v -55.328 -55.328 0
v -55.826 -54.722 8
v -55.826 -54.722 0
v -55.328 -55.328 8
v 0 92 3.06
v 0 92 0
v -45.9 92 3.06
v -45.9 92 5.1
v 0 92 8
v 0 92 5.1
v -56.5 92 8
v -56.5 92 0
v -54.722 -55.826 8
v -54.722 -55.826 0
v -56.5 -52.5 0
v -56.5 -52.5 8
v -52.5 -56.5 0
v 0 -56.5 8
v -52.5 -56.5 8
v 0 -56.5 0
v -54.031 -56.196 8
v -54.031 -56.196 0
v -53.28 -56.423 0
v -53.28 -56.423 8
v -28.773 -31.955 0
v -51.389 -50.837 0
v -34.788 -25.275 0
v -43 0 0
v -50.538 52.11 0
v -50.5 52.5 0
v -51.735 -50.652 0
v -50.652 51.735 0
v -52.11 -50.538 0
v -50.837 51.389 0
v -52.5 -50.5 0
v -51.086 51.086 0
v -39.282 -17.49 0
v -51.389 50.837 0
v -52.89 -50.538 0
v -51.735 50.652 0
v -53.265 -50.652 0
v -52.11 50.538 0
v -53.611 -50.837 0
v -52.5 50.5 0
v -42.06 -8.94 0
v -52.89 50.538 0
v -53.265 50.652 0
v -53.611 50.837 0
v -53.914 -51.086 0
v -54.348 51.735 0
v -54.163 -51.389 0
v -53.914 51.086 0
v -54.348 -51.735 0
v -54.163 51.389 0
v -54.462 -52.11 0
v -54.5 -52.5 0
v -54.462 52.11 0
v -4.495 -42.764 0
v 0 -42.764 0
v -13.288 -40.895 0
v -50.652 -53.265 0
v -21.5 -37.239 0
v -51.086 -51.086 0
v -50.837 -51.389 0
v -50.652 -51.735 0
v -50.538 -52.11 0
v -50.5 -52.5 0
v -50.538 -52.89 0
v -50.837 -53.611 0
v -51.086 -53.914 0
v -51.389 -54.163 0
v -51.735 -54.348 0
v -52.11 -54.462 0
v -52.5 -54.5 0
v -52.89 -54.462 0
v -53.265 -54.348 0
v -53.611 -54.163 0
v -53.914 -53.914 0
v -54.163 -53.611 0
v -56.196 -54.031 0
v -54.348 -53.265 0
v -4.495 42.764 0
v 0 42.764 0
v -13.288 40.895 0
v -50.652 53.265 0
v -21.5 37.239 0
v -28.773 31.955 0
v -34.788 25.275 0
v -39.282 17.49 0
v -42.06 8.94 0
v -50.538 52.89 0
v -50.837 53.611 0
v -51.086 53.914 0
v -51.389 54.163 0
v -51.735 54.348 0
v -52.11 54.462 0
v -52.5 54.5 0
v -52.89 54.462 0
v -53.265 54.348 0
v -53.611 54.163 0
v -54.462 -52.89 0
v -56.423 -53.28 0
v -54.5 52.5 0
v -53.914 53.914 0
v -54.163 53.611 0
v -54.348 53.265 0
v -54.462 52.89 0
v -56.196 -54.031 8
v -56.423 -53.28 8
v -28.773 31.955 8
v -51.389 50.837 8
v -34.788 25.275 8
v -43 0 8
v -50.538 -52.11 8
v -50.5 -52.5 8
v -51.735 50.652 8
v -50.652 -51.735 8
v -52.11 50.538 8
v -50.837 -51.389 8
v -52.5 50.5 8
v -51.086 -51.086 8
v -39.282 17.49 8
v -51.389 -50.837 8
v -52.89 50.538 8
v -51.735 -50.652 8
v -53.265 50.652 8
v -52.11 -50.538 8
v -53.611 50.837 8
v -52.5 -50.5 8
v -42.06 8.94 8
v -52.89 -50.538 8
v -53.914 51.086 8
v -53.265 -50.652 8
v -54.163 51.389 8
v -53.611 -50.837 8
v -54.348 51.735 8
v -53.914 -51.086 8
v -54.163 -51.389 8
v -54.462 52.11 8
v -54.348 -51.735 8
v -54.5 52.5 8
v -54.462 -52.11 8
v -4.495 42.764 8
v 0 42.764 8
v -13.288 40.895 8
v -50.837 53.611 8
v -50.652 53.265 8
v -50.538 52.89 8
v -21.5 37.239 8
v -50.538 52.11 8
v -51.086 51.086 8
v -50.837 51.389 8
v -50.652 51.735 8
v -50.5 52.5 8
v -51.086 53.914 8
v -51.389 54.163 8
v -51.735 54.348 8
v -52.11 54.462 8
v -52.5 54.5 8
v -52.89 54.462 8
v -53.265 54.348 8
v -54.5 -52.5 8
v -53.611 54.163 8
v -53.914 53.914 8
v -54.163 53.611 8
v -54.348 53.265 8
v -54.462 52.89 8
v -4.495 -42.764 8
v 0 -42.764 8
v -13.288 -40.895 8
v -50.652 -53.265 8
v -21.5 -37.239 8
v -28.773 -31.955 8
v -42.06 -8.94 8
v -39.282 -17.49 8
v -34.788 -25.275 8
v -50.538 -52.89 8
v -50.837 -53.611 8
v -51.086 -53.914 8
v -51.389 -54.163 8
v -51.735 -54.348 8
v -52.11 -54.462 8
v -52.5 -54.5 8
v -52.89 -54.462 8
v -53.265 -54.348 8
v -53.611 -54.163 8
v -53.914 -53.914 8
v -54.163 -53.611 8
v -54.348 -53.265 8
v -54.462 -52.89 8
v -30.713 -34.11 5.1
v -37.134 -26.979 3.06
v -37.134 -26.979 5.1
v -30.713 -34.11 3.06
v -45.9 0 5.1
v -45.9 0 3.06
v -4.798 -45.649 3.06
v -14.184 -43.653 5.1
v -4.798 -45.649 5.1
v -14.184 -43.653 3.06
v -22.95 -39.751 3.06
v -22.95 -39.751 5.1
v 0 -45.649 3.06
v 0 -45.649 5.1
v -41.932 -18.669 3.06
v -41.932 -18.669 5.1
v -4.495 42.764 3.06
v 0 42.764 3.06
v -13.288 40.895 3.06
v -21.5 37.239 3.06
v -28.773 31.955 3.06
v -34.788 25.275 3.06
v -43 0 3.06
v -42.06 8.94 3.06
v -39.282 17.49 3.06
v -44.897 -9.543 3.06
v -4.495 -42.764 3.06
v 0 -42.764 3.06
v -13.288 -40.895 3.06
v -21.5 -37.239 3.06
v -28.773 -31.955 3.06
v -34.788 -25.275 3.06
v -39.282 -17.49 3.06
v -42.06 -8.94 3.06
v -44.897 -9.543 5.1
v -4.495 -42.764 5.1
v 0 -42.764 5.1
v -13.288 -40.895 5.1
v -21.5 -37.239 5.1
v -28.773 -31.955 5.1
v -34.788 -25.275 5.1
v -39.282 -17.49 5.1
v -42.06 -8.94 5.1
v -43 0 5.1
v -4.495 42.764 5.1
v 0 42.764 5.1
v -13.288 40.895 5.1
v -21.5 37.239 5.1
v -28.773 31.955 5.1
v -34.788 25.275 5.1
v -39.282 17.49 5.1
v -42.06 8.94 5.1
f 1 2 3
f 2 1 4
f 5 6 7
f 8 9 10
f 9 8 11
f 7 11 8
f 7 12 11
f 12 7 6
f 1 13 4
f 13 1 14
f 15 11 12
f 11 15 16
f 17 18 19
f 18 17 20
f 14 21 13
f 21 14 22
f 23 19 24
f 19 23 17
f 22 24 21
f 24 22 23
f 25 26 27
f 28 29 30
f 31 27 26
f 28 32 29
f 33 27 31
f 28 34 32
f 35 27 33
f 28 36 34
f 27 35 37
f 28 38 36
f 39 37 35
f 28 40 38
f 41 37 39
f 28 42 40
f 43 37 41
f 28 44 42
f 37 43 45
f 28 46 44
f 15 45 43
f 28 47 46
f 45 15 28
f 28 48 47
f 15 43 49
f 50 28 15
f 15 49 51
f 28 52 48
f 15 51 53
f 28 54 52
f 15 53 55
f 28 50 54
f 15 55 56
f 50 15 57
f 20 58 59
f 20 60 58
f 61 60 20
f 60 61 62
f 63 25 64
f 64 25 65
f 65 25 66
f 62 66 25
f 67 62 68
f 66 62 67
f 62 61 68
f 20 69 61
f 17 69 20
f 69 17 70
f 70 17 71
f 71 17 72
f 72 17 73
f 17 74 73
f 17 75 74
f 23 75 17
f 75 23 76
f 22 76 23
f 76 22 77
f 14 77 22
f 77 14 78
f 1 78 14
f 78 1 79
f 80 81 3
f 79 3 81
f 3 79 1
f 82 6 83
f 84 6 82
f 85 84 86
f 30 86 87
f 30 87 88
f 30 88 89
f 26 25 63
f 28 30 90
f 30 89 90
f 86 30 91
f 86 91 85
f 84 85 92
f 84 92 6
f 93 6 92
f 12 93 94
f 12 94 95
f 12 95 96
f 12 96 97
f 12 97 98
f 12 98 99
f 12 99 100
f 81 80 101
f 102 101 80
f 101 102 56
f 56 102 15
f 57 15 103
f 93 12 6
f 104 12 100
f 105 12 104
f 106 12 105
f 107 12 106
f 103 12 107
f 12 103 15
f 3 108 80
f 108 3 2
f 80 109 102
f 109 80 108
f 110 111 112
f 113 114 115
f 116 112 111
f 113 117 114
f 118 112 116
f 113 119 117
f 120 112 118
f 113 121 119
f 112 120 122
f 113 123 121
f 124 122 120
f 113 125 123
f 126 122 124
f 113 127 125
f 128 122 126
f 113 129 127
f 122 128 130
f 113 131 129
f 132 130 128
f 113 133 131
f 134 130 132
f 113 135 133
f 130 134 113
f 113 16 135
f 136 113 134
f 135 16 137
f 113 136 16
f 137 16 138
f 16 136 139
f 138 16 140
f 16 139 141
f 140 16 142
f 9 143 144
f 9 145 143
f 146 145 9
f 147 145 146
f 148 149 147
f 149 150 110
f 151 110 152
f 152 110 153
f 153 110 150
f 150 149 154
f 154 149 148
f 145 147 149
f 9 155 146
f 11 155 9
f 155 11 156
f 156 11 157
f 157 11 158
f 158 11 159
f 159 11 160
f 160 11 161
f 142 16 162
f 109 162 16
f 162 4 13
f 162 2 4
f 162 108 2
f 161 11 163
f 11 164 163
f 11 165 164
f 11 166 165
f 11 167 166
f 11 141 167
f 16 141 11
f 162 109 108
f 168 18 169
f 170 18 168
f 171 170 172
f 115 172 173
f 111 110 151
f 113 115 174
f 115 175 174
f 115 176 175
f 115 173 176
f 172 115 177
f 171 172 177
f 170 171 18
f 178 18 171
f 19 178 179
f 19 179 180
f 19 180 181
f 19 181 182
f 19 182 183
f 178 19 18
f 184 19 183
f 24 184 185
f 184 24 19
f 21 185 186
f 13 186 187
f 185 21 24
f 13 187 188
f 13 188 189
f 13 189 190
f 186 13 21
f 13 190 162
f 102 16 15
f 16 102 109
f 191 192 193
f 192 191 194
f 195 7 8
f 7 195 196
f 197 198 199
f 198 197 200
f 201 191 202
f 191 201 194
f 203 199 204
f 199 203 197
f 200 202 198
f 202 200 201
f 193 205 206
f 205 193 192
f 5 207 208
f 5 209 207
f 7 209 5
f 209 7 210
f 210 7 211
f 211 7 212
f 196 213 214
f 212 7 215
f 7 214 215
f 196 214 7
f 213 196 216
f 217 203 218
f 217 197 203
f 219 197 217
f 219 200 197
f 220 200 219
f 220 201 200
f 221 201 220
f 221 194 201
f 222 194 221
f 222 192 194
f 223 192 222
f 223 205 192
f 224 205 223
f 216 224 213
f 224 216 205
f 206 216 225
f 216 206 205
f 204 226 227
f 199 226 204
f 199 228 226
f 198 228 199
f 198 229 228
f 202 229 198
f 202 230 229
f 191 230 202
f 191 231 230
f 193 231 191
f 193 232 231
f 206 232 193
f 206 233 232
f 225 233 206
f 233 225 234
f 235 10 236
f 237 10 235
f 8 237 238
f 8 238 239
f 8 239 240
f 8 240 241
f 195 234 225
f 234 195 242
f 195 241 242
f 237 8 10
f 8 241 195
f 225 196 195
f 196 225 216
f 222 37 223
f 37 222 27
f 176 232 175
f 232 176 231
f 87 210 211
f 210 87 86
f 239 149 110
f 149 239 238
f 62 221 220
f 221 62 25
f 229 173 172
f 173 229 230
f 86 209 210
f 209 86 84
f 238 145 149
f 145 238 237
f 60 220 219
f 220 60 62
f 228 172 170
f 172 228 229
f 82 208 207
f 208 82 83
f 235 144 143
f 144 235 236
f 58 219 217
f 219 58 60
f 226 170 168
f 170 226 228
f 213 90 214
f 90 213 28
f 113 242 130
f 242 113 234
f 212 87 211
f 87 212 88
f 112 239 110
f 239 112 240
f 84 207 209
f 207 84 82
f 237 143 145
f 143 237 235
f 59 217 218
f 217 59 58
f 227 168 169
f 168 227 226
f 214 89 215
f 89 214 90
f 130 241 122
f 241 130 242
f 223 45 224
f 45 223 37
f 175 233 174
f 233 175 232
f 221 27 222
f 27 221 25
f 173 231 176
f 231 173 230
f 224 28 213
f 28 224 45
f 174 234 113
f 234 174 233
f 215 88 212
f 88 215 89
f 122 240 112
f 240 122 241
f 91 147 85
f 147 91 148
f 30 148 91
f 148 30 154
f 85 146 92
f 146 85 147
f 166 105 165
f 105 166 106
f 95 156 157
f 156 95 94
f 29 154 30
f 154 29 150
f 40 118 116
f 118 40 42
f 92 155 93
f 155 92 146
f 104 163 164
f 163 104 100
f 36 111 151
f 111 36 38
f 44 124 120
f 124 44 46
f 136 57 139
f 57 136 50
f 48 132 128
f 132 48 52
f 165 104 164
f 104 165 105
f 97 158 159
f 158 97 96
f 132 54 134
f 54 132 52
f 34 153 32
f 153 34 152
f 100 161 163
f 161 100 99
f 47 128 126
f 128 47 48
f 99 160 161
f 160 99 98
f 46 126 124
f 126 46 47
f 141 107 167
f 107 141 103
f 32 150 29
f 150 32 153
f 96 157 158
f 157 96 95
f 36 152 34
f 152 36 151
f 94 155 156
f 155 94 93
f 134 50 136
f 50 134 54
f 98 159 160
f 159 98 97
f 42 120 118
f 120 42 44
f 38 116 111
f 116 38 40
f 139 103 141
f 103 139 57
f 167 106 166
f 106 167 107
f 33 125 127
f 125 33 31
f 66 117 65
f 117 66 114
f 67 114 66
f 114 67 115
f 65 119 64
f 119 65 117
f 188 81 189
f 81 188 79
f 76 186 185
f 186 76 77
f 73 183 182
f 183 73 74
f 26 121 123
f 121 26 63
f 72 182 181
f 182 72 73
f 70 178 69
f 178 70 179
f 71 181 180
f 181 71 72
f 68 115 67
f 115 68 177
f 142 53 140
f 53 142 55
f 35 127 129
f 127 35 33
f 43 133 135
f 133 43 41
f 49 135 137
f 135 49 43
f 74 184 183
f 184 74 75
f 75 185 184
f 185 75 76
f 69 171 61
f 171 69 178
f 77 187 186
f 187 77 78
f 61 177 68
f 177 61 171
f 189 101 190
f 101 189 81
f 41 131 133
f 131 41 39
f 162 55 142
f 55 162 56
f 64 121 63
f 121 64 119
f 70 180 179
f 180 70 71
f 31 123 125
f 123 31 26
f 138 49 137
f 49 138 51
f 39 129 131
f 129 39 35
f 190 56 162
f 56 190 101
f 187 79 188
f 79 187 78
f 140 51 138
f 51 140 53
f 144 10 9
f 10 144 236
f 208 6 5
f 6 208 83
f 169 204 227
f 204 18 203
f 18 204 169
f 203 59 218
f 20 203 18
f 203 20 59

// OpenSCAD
// valve for fan
screw_d = 105;
screw_hole = 4;
d = 90;

wall=2;

h = 8;


//lock
module lock() {
hull() {
    cylinder(d=d,h=wall);
    translate([-d/2, d+10, 0]) cube([d,wall,wall]);
}

}
//lock();

module valve() {
    difference() {
    hull() {
        cylinder(d=d+wall*4,h=h);
        translate([-screw_d/2-wall-screw_hole/2, d, 0]) cube([screw_d+wall*2+screw_hole,wall,h]);
        translate([screw_d/2, screw_d/2,0]) cylinder(d=screw_hole+wall*2, h = h, $fn = 32);
    translate([screw_d/2, -screw_d/2, 0]) cylinder(d=screw_hole+wall*2, h =h, $fn = 32);
    translate([-screw_d/2, screw_d/2,0]) cylinder(d=screw_hole+wall*2, h =h, $fn = 32);
    translate([-screw_d/2, -screw_d/2,0]) cylinder(d=screw_hole+wall*2, h = h, $fn = 32);
    }
    scale(1.02)translate([0,0,h/2-wall/2]) lock();
    
    translate([0,0,-3]) cylinder(d=d-wall*2,h=h*2);
    
    //screw holes
    translate([screw_d/2, screw_d/2,-1]) cylinder(d=screw_hole, h = h*2, $fn = 32);
    translate([screw_d/2, -screw_d/2, -1]) cylinder(d=screw_hole, h = h*2, $fn = 32);
    translate([-screw_d/2, screw_d/2,-1]) cylinder(d=screw_hole, h = h*2, $fn = 32);
    translate([-screw_d/2, -screw_d/2,-1]) cylinder(d=screw_hole, h = h*2, $fn = 32);
    
    translate([0,-100,-1])cube([1000,1000,1000]);
    }
    
}

valve();
